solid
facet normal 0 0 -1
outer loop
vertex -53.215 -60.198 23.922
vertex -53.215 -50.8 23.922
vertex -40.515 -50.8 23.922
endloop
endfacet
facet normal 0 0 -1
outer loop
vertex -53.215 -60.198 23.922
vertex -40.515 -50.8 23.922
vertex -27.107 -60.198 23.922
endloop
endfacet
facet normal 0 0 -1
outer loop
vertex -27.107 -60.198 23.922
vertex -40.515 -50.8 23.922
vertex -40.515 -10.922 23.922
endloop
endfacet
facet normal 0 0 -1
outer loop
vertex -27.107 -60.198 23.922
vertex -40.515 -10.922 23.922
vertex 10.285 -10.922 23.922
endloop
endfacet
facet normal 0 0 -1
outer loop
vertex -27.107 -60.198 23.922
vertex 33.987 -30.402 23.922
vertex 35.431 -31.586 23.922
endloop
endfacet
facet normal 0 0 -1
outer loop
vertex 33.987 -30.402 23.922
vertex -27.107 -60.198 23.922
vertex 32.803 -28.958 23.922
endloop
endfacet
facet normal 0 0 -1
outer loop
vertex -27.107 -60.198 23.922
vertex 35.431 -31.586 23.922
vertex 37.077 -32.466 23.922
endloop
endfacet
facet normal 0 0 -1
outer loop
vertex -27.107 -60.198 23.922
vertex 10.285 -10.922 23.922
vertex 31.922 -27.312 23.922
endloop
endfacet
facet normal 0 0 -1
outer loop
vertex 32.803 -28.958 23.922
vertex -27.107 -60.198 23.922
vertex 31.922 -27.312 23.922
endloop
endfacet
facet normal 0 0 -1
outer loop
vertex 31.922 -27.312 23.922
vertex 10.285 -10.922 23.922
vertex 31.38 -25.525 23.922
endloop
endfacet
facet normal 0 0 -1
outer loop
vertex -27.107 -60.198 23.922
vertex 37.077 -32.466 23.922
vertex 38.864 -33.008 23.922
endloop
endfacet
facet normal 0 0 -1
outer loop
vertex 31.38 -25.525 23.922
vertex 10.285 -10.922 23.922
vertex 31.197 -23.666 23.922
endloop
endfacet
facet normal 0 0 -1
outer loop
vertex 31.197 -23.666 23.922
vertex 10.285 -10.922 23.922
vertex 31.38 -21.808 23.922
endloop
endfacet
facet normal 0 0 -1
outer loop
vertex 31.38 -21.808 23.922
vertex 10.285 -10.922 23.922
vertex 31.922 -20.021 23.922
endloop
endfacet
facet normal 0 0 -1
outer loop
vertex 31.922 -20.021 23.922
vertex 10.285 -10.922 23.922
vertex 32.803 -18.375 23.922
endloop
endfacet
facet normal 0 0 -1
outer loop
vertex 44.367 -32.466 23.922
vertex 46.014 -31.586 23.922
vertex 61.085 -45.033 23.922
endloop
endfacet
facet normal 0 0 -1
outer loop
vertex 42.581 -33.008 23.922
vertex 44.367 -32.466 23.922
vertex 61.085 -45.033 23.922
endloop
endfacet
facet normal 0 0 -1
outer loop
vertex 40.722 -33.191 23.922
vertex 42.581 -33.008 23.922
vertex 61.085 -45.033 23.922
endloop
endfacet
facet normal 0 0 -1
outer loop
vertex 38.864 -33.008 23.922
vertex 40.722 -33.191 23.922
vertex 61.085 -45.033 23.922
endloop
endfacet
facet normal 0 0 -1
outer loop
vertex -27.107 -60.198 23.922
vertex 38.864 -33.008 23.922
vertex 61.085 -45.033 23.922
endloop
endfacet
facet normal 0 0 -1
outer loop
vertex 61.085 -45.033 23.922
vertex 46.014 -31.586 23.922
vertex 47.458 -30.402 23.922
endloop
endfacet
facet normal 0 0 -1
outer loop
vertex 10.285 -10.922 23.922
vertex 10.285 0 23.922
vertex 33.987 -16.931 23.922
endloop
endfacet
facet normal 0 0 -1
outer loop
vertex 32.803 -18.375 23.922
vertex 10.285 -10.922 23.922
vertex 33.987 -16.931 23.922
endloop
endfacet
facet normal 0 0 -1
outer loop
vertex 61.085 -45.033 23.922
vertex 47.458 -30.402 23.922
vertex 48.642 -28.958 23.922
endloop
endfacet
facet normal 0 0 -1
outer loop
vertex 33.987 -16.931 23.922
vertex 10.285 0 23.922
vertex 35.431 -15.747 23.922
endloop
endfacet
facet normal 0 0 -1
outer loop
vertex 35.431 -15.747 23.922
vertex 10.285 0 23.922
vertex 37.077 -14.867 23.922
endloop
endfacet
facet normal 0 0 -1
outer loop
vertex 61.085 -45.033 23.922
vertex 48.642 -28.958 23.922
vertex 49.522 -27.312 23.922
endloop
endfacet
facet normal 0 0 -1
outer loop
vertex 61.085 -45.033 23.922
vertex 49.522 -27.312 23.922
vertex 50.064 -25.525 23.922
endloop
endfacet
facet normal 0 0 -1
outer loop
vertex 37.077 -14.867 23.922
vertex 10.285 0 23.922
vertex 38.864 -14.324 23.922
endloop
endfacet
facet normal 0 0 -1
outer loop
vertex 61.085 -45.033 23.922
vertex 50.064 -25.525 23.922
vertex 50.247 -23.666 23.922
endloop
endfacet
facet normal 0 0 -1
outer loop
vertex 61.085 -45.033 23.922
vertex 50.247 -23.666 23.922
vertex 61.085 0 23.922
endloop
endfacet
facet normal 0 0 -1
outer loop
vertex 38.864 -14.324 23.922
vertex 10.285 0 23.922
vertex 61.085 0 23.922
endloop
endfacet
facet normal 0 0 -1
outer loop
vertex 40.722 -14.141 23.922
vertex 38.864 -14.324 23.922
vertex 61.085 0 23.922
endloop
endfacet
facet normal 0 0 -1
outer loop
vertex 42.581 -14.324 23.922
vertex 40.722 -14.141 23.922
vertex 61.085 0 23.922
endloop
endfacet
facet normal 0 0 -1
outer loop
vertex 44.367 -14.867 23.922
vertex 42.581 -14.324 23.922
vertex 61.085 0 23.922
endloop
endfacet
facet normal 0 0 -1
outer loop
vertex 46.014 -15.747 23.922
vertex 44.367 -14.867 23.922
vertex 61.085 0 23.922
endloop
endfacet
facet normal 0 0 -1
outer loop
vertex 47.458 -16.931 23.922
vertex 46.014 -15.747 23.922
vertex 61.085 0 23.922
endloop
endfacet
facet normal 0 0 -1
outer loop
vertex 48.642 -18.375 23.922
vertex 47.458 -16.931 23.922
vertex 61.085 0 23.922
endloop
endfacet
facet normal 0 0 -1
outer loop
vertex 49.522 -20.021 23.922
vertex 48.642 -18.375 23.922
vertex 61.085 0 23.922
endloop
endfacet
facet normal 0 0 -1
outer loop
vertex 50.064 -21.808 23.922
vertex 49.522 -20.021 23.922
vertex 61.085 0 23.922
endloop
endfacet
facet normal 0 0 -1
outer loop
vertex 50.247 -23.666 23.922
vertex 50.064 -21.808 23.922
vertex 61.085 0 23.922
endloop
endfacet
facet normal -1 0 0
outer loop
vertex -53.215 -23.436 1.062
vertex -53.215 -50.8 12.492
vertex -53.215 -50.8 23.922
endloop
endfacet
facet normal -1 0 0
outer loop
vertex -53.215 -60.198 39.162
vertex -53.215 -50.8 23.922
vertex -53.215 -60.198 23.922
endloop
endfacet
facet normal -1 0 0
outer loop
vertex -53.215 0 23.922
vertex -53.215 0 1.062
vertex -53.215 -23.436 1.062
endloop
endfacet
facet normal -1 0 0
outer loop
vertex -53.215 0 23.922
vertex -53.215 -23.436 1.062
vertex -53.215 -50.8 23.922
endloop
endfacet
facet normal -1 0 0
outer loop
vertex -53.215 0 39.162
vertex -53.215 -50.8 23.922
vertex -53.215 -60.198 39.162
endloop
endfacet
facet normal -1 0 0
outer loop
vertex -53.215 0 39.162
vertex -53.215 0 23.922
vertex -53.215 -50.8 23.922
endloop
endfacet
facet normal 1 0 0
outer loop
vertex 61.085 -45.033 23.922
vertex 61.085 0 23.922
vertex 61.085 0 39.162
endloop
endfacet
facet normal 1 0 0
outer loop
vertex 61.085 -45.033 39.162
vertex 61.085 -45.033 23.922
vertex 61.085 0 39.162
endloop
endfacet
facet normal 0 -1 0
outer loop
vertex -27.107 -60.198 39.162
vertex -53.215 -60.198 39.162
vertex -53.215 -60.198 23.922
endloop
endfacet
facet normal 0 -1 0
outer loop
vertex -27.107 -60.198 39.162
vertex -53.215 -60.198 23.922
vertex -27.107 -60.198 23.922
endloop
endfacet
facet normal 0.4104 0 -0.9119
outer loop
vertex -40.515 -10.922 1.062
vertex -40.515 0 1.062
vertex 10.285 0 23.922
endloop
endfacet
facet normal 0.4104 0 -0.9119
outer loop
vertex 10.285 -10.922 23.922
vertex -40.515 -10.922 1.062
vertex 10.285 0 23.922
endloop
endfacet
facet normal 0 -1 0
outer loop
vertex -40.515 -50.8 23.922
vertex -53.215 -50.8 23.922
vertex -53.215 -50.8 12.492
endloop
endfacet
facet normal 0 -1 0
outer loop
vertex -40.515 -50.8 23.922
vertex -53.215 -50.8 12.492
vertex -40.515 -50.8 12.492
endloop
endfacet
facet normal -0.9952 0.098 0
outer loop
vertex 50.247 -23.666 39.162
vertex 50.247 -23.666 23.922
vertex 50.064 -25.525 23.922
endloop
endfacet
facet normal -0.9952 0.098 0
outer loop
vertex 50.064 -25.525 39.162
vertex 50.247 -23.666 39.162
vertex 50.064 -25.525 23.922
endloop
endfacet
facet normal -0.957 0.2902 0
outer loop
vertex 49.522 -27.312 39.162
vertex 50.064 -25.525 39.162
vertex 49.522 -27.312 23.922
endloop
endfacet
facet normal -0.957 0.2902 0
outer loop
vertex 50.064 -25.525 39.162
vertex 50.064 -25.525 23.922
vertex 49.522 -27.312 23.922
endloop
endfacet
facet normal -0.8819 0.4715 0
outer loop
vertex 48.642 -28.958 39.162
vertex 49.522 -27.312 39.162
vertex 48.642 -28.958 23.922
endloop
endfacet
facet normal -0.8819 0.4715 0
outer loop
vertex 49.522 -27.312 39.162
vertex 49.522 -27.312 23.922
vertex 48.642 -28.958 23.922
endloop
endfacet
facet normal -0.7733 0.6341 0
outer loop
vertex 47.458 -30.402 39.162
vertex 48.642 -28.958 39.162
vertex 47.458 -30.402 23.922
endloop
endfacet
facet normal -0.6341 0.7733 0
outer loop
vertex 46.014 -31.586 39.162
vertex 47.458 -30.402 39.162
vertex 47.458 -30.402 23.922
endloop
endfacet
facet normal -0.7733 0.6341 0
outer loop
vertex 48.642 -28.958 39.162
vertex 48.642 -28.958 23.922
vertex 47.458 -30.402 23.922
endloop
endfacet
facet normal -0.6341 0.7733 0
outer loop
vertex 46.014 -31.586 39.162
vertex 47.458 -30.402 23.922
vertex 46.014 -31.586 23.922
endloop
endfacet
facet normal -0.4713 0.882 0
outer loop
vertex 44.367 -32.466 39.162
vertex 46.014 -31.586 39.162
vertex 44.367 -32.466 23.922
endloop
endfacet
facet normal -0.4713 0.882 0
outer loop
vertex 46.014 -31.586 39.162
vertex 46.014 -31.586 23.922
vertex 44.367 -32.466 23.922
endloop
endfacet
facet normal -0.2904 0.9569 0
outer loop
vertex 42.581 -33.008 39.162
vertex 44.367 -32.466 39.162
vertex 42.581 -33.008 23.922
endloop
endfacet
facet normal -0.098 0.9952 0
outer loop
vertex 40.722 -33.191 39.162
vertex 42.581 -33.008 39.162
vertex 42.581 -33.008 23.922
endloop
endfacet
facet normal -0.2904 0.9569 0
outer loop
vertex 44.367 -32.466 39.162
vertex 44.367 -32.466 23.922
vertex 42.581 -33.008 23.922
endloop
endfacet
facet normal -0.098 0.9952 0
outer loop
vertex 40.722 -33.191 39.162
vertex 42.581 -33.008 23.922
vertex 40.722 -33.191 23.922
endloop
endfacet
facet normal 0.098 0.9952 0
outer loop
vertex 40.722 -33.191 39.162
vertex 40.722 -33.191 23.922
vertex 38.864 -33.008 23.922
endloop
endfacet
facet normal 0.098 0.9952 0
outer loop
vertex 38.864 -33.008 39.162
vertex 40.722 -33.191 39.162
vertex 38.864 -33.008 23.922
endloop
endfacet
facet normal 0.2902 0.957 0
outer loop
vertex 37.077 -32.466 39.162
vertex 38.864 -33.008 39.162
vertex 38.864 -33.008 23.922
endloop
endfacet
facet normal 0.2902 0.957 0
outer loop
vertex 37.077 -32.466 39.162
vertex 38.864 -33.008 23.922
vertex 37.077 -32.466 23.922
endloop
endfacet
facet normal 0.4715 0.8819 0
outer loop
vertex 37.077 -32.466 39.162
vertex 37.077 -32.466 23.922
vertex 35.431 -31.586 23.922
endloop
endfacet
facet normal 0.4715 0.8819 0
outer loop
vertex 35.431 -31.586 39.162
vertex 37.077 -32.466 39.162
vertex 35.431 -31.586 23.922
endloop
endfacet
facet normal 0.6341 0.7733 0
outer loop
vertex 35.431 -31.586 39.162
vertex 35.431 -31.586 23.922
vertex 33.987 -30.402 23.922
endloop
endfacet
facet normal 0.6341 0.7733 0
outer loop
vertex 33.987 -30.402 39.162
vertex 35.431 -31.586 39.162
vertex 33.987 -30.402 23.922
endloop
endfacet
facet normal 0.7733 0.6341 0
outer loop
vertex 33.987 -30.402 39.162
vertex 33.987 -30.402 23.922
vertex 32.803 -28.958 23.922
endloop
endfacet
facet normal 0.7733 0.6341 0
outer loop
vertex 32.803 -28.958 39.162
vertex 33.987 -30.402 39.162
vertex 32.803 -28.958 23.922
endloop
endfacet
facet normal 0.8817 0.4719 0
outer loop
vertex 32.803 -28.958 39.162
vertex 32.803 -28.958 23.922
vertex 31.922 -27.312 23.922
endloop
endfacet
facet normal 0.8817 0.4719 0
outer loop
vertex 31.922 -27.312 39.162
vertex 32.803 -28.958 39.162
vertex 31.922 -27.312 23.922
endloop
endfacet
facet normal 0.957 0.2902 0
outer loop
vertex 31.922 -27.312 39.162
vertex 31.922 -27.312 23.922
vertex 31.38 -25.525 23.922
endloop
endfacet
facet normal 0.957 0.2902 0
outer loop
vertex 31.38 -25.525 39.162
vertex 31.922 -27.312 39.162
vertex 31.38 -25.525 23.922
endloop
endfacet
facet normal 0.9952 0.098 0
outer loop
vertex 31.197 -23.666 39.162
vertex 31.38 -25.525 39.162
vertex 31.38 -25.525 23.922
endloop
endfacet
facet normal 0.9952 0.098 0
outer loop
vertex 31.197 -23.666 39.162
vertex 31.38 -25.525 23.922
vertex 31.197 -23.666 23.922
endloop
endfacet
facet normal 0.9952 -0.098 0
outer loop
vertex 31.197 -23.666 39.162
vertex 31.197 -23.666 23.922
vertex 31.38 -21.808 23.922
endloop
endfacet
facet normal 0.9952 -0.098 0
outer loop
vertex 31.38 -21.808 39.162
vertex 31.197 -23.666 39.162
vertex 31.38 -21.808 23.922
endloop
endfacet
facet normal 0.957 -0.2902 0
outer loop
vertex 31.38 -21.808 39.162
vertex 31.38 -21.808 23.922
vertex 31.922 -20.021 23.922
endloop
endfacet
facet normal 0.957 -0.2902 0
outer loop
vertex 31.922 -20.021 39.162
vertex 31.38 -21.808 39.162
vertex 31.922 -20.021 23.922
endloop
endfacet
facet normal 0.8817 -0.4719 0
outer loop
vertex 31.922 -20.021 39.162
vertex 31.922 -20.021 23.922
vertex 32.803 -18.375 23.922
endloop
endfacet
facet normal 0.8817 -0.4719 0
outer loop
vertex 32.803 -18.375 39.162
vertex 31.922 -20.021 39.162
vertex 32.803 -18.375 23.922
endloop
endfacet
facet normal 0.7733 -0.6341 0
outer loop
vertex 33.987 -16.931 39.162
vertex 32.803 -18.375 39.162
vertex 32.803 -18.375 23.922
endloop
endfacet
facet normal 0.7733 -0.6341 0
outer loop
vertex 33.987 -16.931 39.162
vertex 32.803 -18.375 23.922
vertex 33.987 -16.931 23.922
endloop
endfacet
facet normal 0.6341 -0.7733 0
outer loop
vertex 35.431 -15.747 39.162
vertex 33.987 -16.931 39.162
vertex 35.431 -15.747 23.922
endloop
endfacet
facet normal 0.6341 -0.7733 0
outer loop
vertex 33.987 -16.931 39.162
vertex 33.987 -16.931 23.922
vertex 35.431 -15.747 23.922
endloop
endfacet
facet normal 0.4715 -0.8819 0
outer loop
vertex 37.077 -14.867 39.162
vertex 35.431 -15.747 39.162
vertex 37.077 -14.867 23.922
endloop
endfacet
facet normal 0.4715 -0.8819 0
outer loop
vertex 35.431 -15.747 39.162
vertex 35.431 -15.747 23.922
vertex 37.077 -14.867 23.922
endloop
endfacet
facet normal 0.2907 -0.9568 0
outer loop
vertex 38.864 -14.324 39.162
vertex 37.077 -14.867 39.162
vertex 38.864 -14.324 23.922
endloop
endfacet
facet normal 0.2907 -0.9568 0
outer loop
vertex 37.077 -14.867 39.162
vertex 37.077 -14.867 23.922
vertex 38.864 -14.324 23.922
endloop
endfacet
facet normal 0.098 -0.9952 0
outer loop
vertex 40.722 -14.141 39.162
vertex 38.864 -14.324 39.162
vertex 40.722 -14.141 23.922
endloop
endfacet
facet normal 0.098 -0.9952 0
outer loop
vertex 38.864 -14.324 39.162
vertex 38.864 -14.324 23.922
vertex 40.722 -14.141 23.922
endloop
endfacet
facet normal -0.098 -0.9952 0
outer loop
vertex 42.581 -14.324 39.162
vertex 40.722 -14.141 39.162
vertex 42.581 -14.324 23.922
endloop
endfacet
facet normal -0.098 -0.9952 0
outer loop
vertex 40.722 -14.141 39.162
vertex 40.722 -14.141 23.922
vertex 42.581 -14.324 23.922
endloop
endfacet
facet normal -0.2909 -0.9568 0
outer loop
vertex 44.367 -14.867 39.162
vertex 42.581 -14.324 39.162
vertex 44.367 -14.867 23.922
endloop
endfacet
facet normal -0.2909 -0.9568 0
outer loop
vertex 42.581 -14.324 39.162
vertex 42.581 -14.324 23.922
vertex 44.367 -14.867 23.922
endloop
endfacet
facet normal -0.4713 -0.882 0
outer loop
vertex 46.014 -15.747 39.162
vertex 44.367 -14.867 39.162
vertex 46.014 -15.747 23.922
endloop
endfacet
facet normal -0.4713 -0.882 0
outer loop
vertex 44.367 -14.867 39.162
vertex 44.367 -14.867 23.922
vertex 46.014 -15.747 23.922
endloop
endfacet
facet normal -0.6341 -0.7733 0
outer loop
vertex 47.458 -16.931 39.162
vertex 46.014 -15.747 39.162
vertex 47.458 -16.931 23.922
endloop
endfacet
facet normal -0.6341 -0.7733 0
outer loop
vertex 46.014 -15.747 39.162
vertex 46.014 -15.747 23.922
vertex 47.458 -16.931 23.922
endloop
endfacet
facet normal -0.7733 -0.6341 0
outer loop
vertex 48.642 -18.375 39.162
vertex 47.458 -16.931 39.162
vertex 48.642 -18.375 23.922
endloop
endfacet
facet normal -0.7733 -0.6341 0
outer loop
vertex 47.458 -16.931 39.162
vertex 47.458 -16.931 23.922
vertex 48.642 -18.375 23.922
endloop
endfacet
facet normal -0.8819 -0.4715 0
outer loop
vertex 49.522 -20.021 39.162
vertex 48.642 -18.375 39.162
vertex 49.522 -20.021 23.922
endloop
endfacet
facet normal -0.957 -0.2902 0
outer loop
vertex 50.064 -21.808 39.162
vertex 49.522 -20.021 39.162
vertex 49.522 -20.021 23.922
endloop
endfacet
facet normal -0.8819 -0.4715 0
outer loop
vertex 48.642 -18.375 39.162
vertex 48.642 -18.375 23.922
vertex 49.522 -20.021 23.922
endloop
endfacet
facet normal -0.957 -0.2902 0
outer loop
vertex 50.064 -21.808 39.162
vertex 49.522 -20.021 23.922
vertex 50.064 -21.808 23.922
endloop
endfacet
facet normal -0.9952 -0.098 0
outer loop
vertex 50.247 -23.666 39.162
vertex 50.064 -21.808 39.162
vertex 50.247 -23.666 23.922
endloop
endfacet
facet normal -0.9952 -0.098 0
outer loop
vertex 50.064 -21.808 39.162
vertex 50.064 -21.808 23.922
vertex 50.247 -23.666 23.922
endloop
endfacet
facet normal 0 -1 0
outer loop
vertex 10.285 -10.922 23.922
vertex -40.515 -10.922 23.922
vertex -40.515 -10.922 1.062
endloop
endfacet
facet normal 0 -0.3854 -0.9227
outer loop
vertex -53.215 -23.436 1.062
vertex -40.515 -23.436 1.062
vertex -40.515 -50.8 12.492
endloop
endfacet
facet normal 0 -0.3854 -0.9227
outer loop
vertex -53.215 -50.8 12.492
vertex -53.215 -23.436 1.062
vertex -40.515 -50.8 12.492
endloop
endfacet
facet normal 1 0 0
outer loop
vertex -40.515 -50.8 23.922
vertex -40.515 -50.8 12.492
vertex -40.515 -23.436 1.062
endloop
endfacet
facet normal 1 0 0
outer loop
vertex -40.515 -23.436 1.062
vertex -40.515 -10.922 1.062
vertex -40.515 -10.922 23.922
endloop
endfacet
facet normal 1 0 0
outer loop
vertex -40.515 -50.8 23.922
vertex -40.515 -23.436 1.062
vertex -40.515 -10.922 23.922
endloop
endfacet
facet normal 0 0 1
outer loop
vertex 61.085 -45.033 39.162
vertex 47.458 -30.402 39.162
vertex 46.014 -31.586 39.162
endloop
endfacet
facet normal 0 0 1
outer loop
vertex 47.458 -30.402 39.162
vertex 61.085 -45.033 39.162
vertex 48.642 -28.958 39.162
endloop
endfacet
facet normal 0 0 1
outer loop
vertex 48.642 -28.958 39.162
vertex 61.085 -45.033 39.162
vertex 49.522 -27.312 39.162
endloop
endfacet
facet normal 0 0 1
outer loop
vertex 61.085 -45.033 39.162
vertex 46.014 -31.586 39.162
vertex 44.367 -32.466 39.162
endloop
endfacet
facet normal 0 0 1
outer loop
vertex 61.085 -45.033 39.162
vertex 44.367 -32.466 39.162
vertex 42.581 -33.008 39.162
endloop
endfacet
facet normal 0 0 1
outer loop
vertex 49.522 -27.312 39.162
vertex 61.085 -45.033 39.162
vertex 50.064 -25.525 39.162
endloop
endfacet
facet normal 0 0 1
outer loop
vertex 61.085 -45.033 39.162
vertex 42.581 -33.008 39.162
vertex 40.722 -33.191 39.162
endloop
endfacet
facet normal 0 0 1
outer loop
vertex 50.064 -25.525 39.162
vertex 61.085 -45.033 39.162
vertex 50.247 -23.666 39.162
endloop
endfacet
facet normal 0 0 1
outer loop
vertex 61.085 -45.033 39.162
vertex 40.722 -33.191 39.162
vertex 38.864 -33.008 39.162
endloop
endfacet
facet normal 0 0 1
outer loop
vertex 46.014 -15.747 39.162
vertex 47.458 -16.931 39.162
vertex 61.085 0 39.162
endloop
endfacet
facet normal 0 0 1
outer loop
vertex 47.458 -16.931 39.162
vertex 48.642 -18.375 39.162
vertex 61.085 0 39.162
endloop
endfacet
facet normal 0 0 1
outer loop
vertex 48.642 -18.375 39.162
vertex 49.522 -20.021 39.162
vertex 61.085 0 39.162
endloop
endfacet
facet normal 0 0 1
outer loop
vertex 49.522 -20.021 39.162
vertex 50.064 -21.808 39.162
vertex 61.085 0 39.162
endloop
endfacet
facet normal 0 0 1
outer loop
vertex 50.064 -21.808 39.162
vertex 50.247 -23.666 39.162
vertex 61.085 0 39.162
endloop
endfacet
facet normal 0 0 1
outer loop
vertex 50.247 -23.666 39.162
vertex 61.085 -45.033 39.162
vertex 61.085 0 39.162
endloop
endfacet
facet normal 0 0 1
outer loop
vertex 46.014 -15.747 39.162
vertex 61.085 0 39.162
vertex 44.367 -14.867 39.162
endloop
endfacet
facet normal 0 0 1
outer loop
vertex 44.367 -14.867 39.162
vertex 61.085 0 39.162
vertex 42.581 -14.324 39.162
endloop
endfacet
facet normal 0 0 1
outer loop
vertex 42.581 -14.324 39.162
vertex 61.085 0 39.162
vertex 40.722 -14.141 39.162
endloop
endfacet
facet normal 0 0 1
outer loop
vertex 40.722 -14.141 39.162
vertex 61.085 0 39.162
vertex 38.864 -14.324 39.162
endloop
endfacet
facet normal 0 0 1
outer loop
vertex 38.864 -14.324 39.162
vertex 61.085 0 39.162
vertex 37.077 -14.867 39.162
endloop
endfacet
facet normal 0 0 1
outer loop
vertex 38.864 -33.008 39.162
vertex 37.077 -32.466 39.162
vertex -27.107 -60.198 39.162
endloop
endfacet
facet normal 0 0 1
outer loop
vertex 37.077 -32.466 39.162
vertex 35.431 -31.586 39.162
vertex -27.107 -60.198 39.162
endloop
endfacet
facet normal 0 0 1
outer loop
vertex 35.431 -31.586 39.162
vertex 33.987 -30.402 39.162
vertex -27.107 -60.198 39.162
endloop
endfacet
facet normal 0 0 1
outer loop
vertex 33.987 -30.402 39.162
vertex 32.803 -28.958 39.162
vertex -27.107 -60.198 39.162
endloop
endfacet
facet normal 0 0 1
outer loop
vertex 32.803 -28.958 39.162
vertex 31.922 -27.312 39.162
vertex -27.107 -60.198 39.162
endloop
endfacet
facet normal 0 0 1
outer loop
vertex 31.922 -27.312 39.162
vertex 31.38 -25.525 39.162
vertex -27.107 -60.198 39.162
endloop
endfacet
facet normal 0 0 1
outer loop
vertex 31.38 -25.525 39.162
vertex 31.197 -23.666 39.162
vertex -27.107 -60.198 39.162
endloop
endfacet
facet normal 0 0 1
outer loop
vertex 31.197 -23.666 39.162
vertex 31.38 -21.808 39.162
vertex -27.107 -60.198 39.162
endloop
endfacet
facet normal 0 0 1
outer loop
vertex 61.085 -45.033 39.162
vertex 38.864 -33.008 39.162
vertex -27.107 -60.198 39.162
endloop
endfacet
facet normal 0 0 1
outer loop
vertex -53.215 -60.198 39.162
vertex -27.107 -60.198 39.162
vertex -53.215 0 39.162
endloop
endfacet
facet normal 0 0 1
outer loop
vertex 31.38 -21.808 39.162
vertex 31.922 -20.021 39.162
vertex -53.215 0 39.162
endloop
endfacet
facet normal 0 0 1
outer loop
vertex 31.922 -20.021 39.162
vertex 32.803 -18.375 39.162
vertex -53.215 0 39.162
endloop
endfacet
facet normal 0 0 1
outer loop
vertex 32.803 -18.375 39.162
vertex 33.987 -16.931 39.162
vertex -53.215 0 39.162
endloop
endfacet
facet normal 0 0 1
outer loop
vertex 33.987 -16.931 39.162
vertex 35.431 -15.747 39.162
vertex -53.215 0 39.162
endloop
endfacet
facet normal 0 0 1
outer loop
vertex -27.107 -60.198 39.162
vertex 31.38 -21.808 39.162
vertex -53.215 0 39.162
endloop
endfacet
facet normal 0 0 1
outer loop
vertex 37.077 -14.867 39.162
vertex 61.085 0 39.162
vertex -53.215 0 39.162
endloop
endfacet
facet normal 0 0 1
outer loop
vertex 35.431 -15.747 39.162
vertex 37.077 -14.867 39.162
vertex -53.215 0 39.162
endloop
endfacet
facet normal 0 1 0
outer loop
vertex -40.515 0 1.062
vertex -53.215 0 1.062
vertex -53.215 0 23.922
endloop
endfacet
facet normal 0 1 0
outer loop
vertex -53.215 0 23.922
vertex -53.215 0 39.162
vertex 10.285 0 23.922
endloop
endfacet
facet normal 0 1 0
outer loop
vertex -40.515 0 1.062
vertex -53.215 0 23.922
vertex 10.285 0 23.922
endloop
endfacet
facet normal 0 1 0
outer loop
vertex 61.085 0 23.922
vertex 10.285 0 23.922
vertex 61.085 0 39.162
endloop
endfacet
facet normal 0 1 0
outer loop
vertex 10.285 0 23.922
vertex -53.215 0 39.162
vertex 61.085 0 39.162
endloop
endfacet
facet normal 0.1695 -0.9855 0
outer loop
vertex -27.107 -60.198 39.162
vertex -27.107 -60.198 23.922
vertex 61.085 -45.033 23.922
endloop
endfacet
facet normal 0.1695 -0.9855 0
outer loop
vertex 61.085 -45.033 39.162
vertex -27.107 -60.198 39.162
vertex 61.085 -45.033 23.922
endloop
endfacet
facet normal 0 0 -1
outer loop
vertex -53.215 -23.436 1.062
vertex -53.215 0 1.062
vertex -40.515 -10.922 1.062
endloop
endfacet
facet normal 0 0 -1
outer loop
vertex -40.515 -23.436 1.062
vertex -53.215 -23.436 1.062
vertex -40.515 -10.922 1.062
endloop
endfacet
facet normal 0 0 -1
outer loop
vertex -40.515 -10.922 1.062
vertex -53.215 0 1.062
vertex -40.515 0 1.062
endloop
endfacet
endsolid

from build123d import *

# Parameters (mm, degrees)
F1_DEPTH = 10.922
F2_DEPTH = 60.198
F0_W     = 12.6999963462
F0_H     = 22.8600017996
F3_DEPTH = 50.8
F5_DEPTH = 25.4
F6_R     = 9.525
F7_DEPTH = 25.4
F8_DEPTH = 25.4


with BuildPart() as f1:
    # F0 (on Front) → F1 (new body)
    with BuildSketch(Plane.XZ):
        Polygon((10.2849198341, 23.9218054244), (-13.2440533489, 23.9218054244), (-40.5150838196, 23.9218054244), (-40.5150838196, 1.0618036248), align=None)
    extrude(amount=F1_DEPTH)

    # F0 (on Front) → F2 (join)
    with BuildSketch(Plane.XZ):
        Polygon((-13.2440533489, 39.1618055656), (-53.2150801659, 39.1618055656), (-53.2150801659, 23.9218054244), (-40.5150838196, 23.9218054244), (-13.2440533489, 23.9218054244), align=None)
        Polygon((61.0849198341, 39.1618055656), (-13.2440533489, 39.1618055656), (-13.2440533489, 23.9218054244), (10.2849198341, 23.9218054244), (61.0849198341, 23.9218054244), align=None)
    extrude(amount=F2_DEPTH)

    # F0 (on Front) → F3 (join)
    with BuildSketch(Plane.XZ):
        with Locations((-46.8650819927, 12.4918045246)):
            Rectangle(F0_W, F0_H)
    extrude(amount=F3_DEPTH)

    # F4 (on face) → F5 (cut)
    with BuildSketch(Plane.YZ.offset(-40.5150838196)):
        Polygon((-23.4362483025, 1.0618036248), (-50.8, 12.4918045246), (-50.8, 1.0618036248), align=None)
    extrude(amount=-F5_DEPTH, mode=Mode.SUBTRACT)

    # F6 (on face) → F7 (cut)
    with BuildSketch(Plane(origin=(0, 0, 23.9218054244), x_dir=(1, 0, 0), z_dir=(0, 0, -1))):
        Polygon((61.0849198341, 60.198), (-27.1072126925, 60.198), (61.0849198341, 45.0329519808), align=None)
        with Locations((40.7223813236, 23.666460067)):
            Circle(F6_R)
    extrude(amount=-F7_DEPTH, mode=Mode.SUBTRACT)

    # F6 (on face) → F8 (cut)
    with BuildSketch(Plane(origin=(0, 0, 23.9218054244), x_dir=(1, 0, 0), z_dir=(0, 0, -1))):
        Polygon((61.0849198341, 60.198), (-27.1072126925, 60.198), (61.0849198341, 45.0329519808), align=None)
        with Locations((40.7223813236, 23.666460067)):
            Circle(F6_R)
    extrude(amount=-F8_DEPTH, mode=Mode.SUBTRACT)


solid = f1.part
